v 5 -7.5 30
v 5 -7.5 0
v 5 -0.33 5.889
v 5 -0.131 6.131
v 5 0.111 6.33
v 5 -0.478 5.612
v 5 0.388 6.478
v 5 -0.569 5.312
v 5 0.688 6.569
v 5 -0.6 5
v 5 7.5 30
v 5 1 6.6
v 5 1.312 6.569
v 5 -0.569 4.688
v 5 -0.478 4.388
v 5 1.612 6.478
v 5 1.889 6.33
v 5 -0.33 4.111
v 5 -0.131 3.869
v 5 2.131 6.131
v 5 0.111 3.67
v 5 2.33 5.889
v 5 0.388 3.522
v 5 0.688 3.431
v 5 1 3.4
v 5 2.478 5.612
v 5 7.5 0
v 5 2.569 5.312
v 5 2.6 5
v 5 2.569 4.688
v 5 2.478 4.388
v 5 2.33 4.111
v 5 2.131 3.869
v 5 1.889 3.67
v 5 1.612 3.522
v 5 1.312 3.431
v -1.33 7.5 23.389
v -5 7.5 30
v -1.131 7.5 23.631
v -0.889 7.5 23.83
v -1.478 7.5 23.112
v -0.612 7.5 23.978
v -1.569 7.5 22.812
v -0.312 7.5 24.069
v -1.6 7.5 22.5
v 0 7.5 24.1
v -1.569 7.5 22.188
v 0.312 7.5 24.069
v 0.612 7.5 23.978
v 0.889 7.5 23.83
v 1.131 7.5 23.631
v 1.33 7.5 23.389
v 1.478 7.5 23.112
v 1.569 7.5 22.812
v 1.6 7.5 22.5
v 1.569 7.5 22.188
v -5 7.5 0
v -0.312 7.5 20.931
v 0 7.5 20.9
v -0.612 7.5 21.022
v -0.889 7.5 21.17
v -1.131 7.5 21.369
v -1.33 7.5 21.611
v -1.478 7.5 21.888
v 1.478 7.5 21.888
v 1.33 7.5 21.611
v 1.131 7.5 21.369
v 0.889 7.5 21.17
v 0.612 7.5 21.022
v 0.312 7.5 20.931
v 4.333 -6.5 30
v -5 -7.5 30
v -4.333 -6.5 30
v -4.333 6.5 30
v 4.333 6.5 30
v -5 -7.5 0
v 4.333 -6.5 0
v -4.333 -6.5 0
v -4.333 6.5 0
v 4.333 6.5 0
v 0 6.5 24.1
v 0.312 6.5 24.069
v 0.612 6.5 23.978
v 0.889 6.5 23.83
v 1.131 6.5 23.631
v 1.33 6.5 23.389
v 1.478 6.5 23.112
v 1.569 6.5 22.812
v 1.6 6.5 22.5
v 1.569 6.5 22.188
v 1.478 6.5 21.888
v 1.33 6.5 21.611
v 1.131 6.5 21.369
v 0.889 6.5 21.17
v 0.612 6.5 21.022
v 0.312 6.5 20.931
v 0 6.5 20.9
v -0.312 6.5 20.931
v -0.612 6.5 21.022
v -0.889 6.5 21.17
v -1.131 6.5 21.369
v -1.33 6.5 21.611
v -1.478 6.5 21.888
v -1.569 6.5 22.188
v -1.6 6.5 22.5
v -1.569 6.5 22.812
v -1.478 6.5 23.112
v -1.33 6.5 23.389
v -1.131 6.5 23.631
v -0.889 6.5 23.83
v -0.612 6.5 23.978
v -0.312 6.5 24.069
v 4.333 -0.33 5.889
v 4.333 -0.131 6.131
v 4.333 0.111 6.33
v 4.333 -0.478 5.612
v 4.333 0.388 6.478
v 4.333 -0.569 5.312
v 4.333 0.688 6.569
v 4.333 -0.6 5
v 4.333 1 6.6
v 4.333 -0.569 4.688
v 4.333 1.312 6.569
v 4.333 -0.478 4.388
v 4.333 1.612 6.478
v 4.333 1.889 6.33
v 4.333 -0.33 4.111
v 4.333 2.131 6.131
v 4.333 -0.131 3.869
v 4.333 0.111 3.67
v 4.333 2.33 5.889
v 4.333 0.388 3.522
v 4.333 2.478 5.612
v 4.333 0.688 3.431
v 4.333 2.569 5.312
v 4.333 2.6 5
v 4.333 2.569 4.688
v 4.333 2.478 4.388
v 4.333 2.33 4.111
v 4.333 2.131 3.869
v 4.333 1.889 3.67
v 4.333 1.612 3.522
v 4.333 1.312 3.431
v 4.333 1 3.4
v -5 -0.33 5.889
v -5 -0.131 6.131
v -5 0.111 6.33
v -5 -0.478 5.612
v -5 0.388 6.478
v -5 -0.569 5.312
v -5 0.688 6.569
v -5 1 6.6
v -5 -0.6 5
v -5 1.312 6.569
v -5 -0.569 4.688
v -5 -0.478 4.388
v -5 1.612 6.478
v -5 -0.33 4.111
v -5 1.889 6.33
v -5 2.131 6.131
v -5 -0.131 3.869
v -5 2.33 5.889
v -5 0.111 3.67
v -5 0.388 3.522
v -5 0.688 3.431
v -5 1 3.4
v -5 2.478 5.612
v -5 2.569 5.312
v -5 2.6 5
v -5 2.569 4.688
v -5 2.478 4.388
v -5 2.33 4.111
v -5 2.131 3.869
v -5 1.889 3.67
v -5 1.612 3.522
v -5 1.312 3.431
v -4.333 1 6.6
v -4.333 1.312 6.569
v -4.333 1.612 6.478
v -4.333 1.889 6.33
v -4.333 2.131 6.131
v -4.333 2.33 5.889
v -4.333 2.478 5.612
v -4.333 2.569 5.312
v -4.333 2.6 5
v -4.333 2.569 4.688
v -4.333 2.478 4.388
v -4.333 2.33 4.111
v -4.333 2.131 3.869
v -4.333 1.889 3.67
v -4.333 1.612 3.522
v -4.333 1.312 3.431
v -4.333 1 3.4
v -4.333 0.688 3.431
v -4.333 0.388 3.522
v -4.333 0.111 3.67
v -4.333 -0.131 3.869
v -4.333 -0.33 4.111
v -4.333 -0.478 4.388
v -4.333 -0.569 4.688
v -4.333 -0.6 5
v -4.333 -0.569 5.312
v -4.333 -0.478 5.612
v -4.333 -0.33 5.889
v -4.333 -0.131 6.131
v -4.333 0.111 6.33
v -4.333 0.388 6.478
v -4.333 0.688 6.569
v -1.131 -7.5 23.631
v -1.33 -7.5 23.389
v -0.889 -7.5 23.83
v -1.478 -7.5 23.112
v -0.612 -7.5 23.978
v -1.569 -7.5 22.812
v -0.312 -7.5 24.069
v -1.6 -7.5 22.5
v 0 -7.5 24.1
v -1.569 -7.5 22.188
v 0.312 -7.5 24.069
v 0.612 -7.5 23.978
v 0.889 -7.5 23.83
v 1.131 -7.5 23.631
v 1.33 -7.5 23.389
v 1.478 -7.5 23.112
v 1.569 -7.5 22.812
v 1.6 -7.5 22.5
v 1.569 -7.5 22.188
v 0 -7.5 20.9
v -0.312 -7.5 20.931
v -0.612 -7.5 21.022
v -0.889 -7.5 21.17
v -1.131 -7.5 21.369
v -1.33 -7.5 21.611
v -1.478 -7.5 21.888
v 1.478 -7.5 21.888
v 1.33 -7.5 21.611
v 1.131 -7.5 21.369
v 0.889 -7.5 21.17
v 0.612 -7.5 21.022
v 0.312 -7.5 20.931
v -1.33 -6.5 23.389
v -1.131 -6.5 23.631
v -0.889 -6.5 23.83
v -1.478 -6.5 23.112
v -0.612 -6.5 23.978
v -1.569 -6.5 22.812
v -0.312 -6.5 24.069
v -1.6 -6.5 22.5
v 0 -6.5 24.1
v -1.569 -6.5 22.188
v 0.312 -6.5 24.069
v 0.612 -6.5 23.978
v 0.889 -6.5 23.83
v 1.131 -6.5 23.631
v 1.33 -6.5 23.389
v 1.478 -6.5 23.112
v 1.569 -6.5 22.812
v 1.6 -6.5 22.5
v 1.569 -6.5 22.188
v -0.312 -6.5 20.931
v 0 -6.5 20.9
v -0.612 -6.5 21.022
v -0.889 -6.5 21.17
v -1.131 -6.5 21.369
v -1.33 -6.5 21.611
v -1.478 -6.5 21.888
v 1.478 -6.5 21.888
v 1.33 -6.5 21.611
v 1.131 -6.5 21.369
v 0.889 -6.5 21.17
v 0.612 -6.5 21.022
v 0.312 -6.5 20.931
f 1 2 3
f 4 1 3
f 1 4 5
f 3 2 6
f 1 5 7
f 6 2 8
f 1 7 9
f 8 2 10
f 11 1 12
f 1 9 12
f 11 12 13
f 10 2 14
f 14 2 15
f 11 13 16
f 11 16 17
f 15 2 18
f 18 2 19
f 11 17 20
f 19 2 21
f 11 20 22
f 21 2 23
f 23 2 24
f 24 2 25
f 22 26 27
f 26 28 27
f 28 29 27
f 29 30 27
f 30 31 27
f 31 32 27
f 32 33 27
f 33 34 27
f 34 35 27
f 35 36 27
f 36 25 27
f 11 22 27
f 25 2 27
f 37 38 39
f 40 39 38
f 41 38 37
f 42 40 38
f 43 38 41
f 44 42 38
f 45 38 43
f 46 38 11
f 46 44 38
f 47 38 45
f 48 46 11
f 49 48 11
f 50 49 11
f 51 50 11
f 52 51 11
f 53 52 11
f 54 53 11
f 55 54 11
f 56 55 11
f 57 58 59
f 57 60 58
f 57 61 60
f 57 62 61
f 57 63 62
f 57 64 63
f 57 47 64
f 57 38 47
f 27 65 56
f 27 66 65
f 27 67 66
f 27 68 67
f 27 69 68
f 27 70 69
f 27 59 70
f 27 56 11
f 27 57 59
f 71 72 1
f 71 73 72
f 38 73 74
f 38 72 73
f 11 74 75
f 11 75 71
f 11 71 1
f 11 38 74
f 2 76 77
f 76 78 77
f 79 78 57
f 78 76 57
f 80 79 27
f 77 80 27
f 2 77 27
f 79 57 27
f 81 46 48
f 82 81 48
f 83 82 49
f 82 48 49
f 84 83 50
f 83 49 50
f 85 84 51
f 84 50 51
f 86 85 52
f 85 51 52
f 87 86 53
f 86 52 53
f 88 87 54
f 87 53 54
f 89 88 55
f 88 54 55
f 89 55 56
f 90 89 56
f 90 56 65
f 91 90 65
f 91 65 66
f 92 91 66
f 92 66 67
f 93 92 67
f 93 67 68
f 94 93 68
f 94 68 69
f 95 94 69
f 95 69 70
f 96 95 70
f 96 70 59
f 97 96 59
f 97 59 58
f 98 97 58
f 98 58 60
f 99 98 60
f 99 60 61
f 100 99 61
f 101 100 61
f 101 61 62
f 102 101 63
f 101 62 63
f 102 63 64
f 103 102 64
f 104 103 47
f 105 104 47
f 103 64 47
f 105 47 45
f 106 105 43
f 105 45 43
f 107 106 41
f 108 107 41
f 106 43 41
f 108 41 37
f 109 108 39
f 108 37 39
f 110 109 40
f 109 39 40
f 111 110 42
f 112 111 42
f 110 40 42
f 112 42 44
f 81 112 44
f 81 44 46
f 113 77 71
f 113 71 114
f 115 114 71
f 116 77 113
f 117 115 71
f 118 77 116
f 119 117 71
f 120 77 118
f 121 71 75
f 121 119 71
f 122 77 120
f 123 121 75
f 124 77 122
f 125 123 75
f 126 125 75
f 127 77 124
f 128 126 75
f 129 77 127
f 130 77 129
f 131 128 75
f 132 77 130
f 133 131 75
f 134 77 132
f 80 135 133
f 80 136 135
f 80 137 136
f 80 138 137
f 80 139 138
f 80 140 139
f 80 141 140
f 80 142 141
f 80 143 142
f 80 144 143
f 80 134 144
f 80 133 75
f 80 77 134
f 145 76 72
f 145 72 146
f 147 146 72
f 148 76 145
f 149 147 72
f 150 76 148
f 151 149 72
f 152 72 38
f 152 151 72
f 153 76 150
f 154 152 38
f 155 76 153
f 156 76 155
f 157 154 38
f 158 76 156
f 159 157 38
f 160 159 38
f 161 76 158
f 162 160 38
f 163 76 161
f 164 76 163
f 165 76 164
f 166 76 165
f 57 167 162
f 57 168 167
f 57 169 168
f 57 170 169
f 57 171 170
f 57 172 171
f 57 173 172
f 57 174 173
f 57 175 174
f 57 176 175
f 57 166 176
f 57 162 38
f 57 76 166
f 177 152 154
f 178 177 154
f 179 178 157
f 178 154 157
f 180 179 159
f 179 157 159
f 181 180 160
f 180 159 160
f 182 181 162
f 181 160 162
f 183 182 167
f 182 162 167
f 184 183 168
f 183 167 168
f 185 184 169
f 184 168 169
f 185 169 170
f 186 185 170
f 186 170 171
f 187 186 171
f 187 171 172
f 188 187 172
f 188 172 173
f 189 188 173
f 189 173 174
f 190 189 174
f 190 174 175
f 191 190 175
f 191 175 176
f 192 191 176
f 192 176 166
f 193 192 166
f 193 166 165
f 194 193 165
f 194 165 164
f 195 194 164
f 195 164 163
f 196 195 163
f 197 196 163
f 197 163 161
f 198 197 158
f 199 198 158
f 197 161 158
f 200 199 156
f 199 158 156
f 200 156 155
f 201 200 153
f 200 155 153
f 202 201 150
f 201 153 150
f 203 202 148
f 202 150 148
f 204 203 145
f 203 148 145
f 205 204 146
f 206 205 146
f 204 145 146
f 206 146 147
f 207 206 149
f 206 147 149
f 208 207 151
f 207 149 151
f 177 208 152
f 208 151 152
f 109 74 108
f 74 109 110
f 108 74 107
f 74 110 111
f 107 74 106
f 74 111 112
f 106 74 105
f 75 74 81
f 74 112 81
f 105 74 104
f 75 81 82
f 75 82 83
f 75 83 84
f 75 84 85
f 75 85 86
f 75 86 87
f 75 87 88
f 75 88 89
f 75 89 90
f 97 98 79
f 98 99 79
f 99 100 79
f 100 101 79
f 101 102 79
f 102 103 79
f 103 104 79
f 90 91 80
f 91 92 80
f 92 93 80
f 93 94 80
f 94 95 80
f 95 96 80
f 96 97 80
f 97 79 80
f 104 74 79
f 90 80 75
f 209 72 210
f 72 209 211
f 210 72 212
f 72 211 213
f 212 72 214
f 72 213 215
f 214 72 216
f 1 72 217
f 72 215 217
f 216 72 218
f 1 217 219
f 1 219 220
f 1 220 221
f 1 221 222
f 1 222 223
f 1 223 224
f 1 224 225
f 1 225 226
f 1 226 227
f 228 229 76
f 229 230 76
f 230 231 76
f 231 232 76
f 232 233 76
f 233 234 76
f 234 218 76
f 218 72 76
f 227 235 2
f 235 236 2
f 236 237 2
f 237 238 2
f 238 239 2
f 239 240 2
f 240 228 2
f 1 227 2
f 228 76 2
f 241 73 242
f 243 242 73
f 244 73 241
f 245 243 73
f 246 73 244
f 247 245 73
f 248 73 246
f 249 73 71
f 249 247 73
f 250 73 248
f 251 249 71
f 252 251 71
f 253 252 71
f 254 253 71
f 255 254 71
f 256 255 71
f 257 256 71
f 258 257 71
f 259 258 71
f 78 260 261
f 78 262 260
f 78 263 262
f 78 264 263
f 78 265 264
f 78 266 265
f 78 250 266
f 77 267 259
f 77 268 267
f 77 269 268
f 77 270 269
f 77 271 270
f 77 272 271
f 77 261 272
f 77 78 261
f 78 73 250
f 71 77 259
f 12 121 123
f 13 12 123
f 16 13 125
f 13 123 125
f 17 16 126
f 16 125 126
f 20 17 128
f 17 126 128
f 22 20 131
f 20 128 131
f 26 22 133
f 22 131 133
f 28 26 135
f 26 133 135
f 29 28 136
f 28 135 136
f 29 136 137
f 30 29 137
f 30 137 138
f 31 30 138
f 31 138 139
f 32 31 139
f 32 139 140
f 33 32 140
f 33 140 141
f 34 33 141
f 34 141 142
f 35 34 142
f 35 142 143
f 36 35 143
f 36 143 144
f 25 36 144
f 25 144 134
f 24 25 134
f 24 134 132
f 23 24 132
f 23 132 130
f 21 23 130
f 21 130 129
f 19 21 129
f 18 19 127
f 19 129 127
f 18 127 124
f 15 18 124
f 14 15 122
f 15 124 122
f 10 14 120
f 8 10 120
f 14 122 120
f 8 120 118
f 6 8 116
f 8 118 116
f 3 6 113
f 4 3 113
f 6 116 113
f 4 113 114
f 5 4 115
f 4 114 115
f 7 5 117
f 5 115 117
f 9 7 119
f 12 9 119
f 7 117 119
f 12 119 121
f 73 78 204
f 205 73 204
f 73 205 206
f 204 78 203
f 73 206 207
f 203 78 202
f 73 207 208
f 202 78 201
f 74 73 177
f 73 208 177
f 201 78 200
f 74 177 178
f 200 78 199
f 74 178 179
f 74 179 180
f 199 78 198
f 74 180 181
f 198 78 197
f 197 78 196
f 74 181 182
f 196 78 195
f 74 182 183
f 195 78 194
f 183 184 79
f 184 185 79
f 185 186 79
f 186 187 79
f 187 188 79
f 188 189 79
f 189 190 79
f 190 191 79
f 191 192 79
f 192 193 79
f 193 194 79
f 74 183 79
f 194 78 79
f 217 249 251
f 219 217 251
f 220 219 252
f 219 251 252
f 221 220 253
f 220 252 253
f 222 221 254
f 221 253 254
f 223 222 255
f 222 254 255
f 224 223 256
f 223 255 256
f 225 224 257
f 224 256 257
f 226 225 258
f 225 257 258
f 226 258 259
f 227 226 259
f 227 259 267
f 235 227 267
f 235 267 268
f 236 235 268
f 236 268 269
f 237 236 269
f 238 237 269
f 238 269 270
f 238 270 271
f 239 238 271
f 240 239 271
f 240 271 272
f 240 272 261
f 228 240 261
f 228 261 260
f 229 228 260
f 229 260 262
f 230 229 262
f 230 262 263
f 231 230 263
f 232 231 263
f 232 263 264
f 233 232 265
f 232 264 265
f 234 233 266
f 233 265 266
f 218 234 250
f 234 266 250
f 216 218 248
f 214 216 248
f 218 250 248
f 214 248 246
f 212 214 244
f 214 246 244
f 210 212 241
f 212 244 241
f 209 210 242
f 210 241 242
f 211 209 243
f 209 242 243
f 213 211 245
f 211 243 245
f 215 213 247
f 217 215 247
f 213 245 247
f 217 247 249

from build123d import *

# Parameters (mm, degrees)
SKETCH_1_W          = 10
SKETCH_1_H          = 15
SKETCH_1_W_2        = 8.666666666
SKETCH_1_H_2        = 13
EXTRUDE_1_DEPTH     = 30
SKETCH_3_R          = 1.6
CUT_EXTRUDE_2_DEPTH = 34.911649916
SKETCH_4_R          = 1.6
CUT_EXTRUDE_3_DEPTH = 33.5


with BuildPart() as part:
    # ｽｹｯﾁ1 → ﾎﾞｽ - 押し出し1 (new body)
    with BuildSketch(Plane.XY):
        Rectangle(SKETCH_1_W, SKETCH_1_H)
        Rectangle(SKETCH_1_W_2, SKETCH_1_H_2, mode=Mode.SUBTRACT)
    extrude(amount=EXTRUDE_1_DEPTH)

    # ｽｹｯﾁ3 → ｶｯﾄ - 押し出し2 (cut, through all)
    with BuildSketch(Plane(origin=(0, 7.5, 0), x_dir=(1, 0, 0), z_dir=(0, 1, 0))):
        with Locations(Location((0, -22.5, 0), (0, 0, 270))):
            Circle(SKETCH_3_R)
    extrude(amount=-CUT_EXTRUDE_2_DEPTH, mode=Mode.SUBTRACT)

    # ｽｹｯﾁ4 → ｶｯﾄ - 押し出し3 (cut, through all)
    with BuildSketch(Plane.ZY.offset(5)):
        with Locations((5, 1)):
            Circle(SKETCH_4_R)
    extrude(amount=-CUT_EXTRUDE_3_DEPTH, mode=Mode.SUBTRACT)


solid = part.part
